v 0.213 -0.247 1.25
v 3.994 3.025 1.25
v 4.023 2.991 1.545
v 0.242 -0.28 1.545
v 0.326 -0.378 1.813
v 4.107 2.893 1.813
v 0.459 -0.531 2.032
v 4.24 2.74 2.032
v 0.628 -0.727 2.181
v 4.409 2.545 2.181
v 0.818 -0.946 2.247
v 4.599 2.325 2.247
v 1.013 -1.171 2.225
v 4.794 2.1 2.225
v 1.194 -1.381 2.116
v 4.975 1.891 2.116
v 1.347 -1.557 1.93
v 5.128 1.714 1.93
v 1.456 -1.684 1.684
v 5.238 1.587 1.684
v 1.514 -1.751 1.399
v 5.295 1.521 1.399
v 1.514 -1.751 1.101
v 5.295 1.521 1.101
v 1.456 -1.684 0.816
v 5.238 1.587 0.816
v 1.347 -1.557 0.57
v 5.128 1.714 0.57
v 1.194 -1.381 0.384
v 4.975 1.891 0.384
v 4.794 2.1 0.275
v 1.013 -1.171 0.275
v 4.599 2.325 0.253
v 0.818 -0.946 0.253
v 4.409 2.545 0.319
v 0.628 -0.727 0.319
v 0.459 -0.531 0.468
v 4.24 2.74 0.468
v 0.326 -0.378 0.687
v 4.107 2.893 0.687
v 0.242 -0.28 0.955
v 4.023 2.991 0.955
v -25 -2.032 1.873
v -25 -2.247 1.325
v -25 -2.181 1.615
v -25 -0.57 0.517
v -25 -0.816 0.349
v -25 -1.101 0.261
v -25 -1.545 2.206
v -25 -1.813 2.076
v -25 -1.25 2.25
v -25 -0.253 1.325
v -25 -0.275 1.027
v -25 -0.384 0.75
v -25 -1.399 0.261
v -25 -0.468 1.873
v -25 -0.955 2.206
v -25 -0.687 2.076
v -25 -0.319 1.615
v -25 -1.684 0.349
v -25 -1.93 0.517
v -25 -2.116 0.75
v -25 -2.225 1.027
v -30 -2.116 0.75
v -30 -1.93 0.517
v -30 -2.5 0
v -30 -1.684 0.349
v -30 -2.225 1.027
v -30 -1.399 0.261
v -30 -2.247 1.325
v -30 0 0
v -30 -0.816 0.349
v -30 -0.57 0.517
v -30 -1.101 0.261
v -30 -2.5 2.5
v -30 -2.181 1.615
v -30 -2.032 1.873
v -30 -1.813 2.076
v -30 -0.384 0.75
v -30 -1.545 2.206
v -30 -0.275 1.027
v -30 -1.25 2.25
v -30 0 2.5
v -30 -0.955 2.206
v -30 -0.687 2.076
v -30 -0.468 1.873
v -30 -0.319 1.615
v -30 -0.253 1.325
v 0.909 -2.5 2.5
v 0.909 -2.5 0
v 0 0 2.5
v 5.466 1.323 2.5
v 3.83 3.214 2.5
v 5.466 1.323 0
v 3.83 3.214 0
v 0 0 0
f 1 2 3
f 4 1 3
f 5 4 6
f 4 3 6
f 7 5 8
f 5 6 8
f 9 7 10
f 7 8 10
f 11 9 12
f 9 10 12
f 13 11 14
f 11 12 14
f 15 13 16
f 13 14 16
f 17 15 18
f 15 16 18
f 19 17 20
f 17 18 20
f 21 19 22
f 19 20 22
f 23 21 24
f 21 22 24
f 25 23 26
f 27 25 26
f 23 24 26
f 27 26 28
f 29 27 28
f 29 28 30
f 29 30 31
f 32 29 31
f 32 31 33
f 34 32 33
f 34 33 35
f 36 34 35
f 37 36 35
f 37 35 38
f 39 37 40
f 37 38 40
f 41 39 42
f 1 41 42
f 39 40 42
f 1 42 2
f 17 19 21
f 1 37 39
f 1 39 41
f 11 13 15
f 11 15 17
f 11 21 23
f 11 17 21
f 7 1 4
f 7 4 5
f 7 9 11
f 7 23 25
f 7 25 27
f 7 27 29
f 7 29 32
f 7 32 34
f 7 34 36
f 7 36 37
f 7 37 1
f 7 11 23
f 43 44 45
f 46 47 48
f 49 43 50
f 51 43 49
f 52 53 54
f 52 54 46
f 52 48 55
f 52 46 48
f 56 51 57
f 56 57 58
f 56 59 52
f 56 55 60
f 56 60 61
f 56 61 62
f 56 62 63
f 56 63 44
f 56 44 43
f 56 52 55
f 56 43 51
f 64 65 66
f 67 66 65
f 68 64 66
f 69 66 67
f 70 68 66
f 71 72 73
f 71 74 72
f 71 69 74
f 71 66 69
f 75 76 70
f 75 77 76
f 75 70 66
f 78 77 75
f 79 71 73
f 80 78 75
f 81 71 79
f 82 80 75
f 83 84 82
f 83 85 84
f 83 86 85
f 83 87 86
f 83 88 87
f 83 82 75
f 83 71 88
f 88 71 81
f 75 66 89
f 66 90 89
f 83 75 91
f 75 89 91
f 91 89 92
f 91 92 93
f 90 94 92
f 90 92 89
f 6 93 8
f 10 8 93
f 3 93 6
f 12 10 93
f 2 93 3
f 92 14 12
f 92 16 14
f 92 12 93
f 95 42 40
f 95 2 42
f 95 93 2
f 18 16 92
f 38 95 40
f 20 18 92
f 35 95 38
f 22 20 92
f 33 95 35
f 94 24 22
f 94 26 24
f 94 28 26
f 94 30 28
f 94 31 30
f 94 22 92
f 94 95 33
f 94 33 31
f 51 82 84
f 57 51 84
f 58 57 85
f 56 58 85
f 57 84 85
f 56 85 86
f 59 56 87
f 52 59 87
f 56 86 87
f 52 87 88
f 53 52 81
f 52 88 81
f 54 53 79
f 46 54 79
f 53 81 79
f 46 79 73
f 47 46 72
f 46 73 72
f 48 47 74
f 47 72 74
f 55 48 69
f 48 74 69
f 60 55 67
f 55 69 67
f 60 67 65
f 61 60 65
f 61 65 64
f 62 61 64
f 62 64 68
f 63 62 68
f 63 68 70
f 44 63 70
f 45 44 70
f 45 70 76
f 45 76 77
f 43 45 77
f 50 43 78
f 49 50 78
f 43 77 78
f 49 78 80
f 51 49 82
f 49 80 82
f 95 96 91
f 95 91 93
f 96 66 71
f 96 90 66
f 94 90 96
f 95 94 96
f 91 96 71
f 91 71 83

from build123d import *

# Parameters (mm, degrees)
BOSS_EXTRUDE1_DEPTH = 2.5
SKETCH2_R           = 1
CUT_EXTRUDE1_DEPTH  = 5
SKETCH3_R           = 1
CUT_EXTRUDE2_DEPTH  = 5
SKETCH5_R           = 1
BOSS_EXTRUDE2_DEPTH = 5
SKETCH6_W           = 2.5
SKETCH6_H           = 2.5
BOSS_EXTRUDE3_DEPTH = 25
SKETCH7_R           = 1
CUT_EXTRUDE3_DEPTH  = 5


with BuildPart() as part:
    # Sketch1 → Boss-Extrude1 (new body)
    with BuildSketch(Plane.XY):
        Polygon((-5, 0), (0, 0), (3.830222216, 3.213938048), (5.465982834, 1.323359513), (0.909480399, -2.5), (-5, -2.5), align=None)
    extrude(amount=BOSS_EXTRUDE1_DEPTH)

    # Sketch2 → Cut-Extrude1 (cut)
    with BuildSketch(Plane(origin=(3.780724263, 3.271146765, 0), x_dir=(0, 0, -1), z_dir=(0.7562314141303861, 0.6543042474891606, 0))):
        with Locations(Location((-1.25, -1.325649749, 0), (0, 0, 90))):
            Circle(SKETCH2_R)
    extrude(amount=-CUT_EXTRUDE1_DEPTH, mode=Mode.SUBTRACT)

    # Sketch3 → Cut-Extrude2 (cut)
    with BuildSketch(Plane.ZY.offset(5)):
        with Locations((1.25, -1.25)):
            Circle(SKETCH3_R)
    extrude(amount=-CUT_EXTRUDE2_DEPTH, mode=Mode.SUBTRACT)

    # Sketch5 → Boss-Extrude2 (add)
    with BuildSketch(Plane.ZY.offset(5)):
        with Locations((1.25, -1.25)):
            Circle(SKETCH5_R)
    extrude(amount=-BOSS_EXTRUDE2_DEPTH)

    # Sketch6 → Boss-Extrude3 (add)
    with BuildSketch(Plane.ZY.offset(5)):
        with Locations((1.25, -1.25)):
            Rectangle(SKETCH6_W, SKETCH6_H)
    extrude(amount=BOSS_EXTRUDE3_DEPTH)

    # Sketch7 → Cut-Extrude3 (cut)
    with BuildSketch(Plane.ZY.offset(30)):
        with Locations((1.25, -1.25)):
            Circle(SKETCH7_R)
    extrude(amount=-CUT_EXTRUDE3_DEPTH, mode=Mode.SUBTRACT)


solid = part.part
